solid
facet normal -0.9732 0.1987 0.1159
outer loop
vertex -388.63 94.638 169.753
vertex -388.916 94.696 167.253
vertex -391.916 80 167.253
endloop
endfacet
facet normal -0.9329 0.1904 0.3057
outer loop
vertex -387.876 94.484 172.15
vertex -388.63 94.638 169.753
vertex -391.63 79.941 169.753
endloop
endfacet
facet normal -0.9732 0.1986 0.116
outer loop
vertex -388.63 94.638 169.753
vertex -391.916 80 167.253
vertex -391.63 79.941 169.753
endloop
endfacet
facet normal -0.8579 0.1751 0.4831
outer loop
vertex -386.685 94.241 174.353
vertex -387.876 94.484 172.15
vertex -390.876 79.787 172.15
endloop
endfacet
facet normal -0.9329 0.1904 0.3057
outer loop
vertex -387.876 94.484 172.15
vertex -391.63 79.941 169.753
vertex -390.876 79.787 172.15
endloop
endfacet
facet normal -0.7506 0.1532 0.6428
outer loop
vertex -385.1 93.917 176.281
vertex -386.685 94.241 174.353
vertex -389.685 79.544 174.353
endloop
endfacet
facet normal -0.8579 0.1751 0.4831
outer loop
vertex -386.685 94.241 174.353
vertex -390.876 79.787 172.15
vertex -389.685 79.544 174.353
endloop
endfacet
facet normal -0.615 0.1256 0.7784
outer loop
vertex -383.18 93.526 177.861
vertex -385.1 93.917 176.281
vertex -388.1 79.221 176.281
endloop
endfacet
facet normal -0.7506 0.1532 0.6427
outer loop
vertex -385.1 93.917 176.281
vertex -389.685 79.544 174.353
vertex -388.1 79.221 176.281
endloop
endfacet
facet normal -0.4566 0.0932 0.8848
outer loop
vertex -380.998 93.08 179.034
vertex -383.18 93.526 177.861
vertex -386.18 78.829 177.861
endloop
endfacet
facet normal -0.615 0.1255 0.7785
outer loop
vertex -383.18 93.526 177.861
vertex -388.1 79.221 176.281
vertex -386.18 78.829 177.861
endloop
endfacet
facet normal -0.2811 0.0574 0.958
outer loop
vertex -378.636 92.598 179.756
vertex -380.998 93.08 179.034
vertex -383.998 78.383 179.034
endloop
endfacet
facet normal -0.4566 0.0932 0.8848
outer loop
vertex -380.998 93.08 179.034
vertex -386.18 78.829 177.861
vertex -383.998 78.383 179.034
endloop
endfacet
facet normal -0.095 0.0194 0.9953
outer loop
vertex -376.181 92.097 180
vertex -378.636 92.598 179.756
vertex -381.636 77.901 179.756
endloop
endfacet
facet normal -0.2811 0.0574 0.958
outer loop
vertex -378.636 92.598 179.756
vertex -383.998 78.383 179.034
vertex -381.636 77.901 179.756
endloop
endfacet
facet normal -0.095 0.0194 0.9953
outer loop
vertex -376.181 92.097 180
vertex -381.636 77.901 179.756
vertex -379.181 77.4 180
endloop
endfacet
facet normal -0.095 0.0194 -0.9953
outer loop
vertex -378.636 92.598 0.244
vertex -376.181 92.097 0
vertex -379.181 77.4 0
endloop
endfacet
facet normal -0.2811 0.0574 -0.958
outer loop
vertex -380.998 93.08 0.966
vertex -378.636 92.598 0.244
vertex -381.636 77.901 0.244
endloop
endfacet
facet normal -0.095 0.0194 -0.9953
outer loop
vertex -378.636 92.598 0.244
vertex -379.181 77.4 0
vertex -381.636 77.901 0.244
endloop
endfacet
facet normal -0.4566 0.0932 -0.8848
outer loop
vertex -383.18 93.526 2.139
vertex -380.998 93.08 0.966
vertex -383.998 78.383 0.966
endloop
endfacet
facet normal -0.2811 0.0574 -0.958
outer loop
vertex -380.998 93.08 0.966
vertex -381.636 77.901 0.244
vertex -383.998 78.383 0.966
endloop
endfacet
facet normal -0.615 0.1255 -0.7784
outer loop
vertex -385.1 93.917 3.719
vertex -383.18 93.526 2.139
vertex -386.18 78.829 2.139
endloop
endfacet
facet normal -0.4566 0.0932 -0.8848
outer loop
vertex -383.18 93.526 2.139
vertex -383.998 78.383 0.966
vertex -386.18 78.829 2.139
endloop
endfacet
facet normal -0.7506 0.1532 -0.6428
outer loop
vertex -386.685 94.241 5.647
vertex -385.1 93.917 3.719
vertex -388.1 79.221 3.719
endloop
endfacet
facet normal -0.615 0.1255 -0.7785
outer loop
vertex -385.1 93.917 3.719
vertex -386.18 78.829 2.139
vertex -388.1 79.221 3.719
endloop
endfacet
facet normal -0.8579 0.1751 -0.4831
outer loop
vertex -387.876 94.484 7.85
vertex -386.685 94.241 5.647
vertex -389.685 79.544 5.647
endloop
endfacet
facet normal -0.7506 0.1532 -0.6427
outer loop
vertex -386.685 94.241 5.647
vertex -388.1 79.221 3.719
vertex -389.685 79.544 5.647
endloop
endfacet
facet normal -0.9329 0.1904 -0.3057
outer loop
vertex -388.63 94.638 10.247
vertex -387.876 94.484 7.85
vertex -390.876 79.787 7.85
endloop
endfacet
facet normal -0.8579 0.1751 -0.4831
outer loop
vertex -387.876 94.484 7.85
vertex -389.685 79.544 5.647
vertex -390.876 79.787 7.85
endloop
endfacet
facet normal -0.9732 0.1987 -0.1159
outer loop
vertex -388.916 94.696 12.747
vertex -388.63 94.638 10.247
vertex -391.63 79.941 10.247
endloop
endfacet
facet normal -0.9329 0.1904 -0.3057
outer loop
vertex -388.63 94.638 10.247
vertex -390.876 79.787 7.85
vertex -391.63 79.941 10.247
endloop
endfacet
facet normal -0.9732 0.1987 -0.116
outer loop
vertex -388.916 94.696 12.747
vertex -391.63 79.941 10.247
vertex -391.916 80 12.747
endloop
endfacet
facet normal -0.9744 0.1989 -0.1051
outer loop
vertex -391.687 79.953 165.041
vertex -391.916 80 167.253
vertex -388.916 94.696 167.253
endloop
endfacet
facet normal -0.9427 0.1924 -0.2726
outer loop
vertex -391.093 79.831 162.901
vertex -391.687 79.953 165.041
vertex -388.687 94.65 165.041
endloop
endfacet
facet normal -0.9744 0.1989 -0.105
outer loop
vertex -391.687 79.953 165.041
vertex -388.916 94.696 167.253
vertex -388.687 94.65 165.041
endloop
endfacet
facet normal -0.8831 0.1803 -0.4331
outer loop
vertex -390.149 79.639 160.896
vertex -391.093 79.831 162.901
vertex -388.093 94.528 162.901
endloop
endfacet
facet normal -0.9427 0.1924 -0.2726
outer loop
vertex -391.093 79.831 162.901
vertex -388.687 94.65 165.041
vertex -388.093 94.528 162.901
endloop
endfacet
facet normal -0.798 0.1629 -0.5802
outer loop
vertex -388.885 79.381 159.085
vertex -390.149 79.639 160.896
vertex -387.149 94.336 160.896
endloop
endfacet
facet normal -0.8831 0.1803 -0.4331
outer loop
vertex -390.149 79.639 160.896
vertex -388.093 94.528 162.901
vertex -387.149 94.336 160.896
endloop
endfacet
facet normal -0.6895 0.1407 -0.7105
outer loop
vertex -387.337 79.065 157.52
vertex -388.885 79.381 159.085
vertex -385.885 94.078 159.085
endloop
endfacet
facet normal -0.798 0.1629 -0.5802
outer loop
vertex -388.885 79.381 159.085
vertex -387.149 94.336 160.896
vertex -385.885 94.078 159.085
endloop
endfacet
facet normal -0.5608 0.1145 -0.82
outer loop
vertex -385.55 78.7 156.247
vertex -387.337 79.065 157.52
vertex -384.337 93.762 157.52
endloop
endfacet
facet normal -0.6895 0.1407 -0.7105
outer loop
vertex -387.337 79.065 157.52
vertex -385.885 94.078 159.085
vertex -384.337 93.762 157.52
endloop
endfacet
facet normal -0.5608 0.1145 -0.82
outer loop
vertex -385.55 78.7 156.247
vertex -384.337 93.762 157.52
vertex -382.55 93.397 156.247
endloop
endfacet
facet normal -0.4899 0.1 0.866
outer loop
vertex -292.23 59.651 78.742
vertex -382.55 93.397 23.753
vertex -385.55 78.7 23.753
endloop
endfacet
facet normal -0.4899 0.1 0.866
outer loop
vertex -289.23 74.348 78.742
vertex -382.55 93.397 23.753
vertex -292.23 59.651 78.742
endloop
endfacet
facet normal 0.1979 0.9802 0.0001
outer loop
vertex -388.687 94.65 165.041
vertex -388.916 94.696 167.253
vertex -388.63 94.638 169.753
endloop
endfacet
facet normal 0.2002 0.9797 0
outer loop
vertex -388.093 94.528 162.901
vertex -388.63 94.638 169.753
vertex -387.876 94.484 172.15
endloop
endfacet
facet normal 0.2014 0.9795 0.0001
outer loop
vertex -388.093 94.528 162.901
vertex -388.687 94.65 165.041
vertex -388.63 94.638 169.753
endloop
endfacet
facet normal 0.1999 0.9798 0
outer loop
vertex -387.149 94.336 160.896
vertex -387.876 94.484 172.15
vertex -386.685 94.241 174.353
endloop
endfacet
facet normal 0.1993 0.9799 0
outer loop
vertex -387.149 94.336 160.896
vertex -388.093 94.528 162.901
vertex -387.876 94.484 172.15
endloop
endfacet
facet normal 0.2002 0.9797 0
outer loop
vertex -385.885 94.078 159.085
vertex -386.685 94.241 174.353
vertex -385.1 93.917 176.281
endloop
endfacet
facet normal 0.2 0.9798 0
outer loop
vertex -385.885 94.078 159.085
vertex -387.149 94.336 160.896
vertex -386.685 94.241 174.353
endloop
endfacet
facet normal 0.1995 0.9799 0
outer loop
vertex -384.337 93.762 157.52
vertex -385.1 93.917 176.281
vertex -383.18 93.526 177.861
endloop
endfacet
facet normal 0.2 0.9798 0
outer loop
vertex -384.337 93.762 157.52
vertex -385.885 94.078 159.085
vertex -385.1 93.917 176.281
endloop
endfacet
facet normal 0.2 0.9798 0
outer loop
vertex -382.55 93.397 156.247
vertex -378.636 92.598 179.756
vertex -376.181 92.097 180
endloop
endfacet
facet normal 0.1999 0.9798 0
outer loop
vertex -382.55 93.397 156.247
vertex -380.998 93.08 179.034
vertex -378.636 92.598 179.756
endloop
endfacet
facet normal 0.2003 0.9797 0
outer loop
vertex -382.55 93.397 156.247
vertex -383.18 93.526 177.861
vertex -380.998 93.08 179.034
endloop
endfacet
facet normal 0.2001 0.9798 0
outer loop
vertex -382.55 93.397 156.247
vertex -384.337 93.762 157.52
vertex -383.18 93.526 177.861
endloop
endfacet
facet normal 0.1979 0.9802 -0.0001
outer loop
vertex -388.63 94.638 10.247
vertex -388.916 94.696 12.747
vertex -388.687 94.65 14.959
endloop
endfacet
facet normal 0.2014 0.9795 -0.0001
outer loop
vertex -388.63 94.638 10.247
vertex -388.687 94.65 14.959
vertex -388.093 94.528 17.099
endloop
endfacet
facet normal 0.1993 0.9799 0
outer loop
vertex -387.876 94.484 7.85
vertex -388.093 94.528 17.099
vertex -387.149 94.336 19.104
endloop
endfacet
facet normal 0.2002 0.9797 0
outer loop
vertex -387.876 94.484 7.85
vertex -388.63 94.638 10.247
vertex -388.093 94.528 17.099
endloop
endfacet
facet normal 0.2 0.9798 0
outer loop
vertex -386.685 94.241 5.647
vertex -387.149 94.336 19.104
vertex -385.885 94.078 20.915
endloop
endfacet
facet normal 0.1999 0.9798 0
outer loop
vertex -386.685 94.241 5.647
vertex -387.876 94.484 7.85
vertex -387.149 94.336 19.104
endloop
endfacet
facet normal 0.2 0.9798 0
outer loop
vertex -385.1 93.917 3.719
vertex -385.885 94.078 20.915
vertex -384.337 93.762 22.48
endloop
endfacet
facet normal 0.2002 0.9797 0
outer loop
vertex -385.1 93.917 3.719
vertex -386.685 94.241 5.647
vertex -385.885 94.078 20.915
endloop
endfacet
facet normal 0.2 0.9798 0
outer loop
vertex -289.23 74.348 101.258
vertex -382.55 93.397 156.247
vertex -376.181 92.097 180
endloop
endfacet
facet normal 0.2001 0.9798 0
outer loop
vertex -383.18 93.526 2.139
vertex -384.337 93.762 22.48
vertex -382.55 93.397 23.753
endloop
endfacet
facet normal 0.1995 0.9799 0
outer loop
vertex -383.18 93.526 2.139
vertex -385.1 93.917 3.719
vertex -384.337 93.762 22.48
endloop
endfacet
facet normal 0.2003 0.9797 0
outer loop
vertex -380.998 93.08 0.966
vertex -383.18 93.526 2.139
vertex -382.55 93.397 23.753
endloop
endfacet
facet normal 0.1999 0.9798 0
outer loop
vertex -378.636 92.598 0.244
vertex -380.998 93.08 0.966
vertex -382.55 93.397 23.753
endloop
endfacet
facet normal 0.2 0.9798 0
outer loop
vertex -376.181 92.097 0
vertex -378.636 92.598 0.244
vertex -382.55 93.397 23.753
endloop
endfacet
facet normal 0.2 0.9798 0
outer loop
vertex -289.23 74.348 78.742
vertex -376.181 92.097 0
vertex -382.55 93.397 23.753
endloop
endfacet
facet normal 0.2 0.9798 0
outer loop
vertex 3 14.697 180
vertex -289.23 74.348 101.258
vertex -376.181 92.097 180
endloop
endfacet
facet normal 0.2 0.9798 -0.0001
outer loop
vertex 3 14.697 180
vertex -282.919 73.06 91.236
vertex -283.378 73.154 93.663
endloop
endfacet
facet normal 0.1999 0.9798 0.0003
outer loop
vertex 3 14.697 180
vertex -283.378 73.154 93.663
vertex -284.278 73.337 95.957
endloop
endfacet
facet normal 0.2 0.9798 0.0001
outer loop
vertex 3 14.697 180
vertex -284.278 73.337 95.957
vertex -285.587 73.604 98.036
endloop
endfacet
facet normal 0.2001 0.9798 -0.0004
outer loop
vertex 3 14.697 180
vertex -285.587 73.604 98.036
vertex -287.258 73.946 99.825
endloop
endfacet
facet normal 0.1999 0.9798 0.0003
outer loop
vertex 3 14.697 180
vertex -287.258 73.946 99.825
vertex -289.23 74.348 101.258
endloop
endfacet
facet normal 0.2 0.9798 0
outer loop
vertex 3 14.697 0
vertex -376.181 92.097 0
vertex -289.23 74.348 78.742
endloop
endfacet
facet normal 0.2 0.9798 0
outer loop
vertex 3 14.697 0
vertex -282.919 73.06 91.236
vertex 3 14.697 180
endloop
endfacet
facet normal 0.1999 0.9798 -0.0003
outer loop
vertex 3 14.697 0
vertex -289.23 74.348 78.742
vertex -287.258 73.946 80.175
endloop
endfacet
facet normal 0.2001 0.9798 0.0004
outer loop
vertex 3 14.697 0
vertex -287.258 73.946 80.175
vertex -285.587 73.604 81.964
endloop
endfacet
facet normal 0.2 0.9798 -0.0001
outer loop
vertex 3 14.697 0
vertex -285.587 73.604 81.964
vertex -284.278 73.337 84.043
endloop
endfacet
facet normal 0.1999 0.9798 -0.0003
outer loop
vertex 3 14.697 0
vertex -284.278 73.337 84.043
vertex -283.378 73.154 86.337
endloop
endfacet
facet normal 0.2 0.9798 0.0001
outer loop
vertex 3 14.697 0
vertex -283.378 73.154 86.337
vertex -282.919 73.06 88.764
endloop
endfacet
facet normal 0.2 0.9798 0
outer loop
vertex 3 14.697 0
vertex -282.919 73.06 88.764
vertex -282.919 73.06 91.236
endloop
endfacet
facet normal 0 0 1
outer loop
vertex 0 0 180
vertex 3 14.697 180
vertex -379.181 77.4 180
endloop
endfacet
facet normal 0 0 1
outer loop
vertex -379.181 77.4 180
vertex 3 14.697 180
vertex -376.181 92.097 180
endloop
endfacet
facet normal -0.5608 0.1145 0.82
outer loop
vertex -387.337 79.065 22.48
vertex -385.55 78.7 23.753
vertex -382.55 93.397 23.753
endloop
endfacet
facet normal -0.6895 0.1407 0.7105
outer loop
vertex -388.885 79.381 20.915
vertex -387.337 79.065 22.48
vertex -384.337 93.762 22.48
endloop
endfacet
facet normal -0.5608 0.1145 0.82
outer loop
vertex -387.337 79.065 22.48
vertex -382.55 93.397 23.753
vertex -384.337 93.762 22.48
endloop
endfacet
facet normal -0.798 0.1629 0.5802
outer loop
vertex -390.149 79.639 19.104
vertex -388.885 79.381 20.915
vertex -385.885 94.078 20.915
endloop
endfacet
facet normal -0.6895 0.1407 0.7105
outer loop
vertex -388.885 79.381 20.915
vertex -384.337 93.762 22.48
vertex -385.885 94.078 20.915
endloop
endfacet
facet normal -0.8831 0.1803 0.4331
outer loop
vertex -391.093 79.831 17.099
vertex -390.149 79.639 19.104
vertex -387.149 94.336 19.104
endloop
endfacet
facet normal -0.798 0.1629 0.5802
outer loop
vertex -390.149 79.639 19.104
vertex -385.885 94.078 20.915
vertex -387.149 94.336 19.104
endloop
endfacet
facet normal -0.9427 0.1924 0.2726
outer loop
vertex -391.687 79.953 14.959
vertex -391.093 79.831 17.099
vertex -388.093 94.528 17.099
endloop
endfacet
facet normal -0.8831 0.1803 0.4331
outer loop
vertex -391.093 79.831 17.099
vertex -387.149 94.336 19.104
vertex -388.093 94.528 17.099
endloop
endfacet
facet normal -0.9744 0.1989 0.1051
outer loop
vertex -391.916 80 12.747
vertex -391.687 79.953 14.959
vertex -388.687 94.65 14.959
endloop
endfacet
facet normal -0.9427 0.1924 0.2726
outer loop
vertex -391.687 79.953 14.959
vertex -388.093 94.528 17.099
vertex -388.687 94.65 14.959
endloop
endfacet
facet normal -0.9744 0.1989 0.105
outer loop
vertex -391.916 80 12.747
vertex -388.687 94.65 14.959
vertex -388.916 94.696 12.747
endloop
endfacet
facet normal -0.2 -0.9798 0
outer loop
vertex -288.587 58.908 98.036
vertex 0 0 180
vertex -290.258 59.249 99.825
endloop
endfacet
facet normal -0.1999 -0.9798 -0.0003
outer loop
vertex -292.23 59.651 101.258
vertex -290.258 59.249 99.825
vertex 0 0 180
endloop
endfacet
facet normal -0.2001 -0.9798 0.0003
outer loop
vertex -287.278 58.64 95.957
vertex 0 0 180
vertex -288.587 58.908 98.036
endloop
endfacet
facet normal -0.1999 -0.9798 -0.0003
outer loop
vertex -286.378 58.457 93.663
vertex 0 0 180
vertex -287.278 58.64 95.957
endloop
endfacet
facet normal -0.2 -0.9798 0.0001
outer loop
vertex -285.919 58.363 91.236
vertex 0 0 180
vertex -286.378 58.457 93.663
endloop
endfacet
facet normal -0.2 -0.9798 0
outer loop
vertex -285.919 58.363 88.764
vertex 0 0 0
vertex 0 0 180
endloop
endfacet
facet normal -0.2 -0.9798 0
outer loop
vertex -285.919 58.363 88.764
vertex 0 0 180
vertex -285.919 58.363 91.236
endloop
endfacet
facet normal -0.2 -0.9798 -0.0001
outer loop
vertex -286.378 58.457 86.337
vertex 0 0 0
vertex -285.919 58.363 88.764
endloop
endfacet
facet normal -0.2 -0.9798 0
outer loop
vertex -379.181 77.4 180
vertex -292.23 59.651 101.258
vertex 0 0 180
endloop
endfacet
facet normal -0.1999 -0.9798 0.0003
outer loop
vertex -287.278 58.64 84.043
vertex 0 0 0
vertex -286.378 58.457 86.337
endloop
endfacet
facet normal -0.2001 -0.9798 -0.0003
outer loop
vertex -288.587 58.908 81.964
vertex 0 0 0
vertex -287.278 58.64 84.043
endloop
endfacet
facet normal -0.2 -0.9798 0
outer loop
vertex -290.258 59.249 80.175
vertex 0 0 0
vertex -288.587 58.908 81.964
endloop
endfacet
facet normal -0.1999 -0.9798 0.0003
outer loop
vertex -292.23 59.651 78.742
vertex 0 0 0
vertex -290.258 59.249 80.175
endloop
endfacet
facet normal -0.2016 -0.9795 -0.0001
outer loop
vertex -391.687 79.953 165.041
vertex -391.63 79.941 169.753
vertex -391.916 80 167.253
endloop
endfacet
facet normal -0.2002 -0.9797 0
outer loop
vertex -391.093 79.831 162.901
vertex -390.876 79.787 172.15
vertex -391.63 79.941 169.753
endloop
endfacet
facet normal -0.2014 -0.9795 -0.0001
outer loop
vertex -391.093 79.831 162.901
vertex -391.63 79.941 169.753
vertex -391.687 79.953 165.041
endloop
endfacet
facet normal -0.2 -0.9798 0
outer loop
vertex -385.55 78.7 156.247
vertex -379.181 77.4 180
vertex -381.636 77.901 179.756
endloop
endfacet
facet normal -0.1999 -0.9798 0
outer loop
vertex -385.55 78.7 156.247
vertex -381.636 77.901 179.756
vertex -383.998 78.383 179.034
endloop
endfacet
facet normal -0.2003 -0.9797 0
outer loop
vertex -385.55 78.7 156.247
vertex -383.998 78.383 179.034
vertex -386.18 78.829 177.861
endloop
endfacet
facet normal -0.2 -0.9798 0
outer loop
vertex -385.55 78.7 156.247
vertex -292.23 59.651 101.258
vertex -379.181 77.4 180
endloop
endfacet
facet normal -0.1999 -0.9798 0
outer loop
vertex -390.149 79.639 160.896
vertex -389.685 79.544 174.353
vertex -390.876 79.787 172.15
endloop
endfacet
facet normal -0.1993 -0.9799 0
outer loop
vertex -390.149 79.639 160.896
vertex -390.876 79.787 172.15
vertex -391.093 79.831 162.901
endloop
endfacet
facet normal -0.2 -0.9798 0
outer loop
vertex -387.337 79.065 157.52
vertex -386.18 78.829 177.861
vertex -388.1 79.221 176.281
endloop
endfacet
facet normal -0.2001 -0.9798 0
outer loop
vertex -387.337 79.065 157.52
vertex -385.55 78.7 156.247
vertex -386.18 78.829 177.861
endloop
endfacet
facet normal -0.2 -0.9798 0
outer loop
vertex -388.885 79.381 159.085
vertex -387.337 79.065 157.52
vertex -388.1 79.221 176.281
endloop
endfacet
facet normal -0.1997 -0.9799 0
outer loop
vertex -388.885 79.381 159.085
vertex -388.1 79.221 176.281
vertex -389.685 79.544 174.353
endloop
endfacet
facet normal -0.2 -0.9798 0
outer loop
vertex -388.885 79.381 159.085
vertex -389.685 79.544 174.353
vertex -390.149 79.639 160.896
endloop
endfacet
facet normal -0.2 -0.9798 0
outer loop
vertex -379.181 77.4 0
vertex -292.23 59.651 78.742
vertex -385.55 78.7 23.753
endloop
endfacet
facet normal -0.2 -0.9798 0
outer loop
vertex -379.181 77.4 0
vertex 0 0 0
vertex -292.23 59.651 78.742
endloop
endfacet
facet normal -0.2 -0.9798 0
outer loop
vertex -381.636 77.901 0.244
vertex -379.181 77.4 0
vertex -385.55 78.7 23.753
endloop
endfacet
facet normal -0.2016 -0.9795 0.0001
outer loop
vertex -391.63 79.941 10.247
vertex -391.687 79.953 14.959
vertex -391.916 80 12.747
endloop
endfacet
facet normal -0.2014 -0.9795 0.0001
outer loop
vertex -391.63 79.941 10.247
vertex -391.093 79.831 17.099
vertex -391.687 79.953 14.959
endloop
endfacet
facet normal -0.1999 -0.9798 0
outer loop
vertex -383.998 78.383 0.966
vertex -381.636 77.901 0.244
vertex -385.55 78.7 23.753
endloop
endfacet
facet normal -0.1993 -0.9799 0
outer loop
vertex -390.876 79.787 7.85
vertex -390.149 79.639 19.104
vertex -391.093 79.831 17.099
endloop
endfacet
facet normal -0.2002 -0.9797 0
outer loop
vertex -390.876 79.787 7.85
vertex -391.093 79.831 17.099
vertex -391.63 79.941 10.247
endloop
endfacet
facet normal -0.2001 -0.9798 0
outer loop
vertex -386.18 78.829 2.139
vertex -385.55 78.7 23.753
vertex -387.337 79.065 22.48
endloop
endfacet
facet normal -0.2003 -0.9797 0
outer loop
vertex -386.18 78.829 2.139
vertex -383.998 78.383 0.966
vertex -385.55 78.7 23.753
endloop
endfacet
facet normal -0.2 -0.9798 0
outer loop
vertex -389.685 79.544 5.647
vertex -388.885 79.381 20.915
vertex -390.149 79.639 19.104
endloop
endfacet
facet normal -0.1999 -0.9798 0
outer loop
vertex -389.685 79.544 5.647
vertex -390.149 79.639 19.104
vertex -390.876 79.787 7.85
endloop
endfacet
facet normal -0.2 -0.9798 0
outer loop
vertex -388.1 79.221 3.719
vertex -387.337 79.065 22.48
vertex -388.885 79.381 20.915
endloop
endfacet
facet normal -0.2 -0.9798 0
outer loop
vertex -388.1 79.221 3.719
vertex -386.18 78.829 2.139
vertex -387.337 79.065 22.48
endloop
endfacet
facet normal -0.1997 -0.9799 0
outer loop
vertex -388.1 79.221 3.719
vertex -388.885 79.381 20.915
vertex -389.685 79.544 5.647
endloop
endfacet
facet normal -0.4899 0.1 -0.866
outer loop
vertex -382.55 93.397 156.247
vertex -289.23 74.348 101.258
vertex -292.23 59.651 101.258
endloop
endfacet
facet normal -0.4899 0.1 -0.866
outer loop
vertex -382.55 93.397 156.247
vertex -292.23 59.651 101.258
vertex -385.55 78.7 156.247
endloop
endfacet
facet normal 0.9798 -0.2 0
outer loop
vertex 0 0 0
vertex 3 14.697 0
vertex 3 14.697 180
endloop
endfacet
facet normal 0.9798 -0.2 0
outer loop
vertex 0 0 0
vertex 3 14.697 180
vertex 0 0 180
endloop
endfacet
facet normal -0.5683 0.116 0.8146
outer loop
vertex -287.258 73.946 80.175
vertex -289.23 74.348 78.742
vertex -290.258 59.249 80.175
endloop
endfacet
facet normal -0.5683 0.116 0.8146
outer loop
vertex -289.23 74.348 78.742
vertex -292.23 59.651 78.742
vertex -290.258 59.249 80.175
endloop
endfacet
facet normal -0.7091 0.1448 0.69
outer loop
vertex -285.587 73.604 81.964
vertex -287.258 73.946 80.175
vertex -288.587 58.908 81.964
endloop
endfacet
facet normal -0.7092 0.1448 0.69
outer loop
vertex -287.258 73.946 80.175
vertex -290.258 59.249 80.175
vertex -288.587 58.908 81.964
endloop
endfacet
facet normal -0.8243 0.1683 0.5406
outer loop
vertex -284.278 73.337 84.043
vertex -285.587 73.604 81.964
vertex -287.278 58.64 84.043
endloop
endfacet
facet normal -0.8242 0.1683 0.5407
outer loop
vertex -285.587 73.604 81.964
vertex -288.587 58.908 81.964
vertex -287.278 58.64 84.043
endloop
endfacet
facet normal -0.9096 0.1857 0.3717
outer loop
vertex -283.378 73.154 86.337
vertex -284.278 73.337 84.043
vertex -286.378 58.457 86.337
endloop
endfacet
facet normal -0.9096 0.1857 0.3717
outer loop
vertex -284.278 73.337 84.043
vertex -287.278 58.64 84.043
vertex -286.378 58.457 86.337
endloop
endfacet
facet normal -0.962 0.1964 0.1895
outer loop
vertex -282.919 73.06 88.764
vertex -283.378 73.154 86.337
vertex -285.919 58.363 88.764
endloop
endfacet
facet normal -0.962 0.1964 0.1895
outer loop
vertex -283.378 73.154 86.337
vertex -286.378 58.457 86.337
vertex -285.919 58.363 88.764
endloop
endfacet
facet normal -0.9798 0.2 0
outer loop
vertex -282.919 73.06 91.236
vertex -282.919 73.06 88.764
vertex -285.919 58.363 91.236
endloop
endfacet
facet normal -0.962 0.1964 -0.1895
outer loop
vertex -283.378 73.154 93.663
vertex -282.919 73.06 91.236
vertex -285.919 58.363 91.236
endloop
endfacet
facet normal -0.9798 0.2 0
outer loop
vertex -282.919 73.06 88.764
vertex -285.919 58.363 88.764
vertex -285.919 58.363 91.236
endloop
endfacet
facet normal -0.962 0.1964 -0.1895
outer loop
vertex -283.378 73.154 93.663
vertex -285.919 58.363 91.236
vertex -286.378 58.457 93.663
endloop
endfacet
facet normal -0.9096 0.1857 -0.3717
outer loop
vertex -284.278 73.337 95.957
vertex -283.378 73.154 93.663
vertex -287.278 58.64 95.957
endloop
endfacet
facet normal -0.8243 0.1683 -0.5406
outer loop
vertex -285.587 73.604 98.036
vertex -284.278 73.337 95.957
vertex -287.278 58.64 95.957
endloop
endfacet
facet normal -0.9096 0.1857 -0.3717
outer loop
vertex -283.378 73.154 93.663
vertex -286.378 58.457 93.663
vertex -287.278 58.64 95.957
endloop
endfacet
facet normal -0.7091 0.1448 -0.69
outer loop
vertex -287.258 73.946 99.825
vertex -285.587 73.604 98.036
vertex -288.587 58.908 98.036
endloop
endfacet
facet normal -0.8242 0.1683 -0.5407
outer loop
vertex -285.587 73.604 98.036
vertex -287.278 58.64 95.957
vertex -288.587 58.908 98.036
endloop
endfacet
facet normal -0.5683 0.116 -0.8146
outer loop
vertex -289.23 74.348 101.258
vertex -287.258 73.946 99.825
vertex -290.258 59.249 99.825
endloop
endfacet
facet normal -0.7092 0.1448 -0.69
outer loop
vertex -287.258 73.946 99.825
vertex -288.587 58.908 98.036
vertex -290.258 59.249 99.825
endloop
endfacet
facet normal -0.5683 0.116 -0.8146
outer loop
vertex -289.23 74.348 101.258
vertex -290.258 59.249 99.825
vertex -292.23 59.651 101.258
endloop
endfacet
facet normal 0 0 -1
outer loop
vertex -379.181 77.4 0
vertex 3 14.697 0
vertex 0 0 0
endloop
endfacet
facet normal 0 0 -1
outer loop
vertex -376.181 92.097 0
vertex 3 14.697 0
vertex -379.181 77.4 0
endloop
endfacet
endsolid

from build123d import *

# Parameters (mm, degrees)
BOSS_EXTRUDE3_DEPTH = 180
CUT_EXTRUDE1_DEPTH  = 180
FILLET1_R           = 13
FILLET2_R           = 13


with BuildPart() as part:
    # Sketch1 → Boss-Extrude3 (new body)
    with BuildSketch(Plane.XY):
        Polygon((0, 0), (-391.918358845, 80), (-388.918358845, 94.696938457), (3, 14.696938457), align=None)
    extrude(amount=BOSS_EXTRUDE3_DEPTH)

    # Sketch4 → Cut-Extrude1 (cut)
    with BuildSketch(Plane(origin=(3, 14.696938457, 0), x_dir=(0.9797958971132712, -0.2, 0), z_dir=(0.2, 0.9797958971132712, 0))):
        Polygon((-400, -20), (-278.75644347, -90), (-400, -160), align=None)
    extrude(amount=-CUT_EXTRUDE1_DEPTH, mode=Mode.SUBTRACT)

    # Fillet1
    # the kernel refuses this fillet: 13 mm, written as the material it takes off along each edge
    with BuildSketch(Plane(origin=(-398.418358845, 48.156633344, 0), x_dir=(0.9797958971132713, -0.19999999999999976, 0), z_dir=(0.19999999999999976, 0.9797958971132713, 0)), Plane(origin=(-398.418358845, 48.156633344, 180), x_dir=(0, 0, -1), z_dir=(0.19999999999999976, 0.9797958971132713, 0))) as fillet1_piece_1:
        with BuildLine():
            CenterArc((FILLET1_R, -FILLET1_R), FILLET1_R, 90, 90)
            Line((0, -FILLET1_R), (0, 0))
            Line((0, 0), (FILLET1_R, 0))
        make_face()
    extrude(amount=80, mode=Mode.SUBTRACT)
    with BuildSketch(Plane(origin=(-385.165582096, 113.081714768, 20), x_dir=(0, 0, -1), z_dir=(-0.20000000000000004, -0.9797958971132713, 0)), Plane(origin=(-385.165582096, 113.081714768, 160), x_dir=(0.8485281374238575, -0.17320508075688784, -0.4999999999999992), z_dir=(-0.20000000000000004, -0.9797958971132713, 0))) as fillet1_piece_2:
        with BuildLine():
            CenterArc((FILLET1_R * 0.57735026919, FILLET1_R), FILLET1_R, 210, 60)
            Line((-FILLET1_R * 0.288675134595, FILLET1_R * 0.5), (0, 0))
            Line((0, 0), (FILLET1_R * 0.57735026919, 0))
        make_face()
    extrude(amount=52.527767497, mode=Mode.SUBTRACT)

    # Fillet2
    fillet2_edges = [part.edges().sort_by_distance(p)[0] for p in [
        (-271.624419606, 63.099757922, 90),
    ]]
    fillet(fillet2_edges, radius=FILLET2_R)


solid = part.part
